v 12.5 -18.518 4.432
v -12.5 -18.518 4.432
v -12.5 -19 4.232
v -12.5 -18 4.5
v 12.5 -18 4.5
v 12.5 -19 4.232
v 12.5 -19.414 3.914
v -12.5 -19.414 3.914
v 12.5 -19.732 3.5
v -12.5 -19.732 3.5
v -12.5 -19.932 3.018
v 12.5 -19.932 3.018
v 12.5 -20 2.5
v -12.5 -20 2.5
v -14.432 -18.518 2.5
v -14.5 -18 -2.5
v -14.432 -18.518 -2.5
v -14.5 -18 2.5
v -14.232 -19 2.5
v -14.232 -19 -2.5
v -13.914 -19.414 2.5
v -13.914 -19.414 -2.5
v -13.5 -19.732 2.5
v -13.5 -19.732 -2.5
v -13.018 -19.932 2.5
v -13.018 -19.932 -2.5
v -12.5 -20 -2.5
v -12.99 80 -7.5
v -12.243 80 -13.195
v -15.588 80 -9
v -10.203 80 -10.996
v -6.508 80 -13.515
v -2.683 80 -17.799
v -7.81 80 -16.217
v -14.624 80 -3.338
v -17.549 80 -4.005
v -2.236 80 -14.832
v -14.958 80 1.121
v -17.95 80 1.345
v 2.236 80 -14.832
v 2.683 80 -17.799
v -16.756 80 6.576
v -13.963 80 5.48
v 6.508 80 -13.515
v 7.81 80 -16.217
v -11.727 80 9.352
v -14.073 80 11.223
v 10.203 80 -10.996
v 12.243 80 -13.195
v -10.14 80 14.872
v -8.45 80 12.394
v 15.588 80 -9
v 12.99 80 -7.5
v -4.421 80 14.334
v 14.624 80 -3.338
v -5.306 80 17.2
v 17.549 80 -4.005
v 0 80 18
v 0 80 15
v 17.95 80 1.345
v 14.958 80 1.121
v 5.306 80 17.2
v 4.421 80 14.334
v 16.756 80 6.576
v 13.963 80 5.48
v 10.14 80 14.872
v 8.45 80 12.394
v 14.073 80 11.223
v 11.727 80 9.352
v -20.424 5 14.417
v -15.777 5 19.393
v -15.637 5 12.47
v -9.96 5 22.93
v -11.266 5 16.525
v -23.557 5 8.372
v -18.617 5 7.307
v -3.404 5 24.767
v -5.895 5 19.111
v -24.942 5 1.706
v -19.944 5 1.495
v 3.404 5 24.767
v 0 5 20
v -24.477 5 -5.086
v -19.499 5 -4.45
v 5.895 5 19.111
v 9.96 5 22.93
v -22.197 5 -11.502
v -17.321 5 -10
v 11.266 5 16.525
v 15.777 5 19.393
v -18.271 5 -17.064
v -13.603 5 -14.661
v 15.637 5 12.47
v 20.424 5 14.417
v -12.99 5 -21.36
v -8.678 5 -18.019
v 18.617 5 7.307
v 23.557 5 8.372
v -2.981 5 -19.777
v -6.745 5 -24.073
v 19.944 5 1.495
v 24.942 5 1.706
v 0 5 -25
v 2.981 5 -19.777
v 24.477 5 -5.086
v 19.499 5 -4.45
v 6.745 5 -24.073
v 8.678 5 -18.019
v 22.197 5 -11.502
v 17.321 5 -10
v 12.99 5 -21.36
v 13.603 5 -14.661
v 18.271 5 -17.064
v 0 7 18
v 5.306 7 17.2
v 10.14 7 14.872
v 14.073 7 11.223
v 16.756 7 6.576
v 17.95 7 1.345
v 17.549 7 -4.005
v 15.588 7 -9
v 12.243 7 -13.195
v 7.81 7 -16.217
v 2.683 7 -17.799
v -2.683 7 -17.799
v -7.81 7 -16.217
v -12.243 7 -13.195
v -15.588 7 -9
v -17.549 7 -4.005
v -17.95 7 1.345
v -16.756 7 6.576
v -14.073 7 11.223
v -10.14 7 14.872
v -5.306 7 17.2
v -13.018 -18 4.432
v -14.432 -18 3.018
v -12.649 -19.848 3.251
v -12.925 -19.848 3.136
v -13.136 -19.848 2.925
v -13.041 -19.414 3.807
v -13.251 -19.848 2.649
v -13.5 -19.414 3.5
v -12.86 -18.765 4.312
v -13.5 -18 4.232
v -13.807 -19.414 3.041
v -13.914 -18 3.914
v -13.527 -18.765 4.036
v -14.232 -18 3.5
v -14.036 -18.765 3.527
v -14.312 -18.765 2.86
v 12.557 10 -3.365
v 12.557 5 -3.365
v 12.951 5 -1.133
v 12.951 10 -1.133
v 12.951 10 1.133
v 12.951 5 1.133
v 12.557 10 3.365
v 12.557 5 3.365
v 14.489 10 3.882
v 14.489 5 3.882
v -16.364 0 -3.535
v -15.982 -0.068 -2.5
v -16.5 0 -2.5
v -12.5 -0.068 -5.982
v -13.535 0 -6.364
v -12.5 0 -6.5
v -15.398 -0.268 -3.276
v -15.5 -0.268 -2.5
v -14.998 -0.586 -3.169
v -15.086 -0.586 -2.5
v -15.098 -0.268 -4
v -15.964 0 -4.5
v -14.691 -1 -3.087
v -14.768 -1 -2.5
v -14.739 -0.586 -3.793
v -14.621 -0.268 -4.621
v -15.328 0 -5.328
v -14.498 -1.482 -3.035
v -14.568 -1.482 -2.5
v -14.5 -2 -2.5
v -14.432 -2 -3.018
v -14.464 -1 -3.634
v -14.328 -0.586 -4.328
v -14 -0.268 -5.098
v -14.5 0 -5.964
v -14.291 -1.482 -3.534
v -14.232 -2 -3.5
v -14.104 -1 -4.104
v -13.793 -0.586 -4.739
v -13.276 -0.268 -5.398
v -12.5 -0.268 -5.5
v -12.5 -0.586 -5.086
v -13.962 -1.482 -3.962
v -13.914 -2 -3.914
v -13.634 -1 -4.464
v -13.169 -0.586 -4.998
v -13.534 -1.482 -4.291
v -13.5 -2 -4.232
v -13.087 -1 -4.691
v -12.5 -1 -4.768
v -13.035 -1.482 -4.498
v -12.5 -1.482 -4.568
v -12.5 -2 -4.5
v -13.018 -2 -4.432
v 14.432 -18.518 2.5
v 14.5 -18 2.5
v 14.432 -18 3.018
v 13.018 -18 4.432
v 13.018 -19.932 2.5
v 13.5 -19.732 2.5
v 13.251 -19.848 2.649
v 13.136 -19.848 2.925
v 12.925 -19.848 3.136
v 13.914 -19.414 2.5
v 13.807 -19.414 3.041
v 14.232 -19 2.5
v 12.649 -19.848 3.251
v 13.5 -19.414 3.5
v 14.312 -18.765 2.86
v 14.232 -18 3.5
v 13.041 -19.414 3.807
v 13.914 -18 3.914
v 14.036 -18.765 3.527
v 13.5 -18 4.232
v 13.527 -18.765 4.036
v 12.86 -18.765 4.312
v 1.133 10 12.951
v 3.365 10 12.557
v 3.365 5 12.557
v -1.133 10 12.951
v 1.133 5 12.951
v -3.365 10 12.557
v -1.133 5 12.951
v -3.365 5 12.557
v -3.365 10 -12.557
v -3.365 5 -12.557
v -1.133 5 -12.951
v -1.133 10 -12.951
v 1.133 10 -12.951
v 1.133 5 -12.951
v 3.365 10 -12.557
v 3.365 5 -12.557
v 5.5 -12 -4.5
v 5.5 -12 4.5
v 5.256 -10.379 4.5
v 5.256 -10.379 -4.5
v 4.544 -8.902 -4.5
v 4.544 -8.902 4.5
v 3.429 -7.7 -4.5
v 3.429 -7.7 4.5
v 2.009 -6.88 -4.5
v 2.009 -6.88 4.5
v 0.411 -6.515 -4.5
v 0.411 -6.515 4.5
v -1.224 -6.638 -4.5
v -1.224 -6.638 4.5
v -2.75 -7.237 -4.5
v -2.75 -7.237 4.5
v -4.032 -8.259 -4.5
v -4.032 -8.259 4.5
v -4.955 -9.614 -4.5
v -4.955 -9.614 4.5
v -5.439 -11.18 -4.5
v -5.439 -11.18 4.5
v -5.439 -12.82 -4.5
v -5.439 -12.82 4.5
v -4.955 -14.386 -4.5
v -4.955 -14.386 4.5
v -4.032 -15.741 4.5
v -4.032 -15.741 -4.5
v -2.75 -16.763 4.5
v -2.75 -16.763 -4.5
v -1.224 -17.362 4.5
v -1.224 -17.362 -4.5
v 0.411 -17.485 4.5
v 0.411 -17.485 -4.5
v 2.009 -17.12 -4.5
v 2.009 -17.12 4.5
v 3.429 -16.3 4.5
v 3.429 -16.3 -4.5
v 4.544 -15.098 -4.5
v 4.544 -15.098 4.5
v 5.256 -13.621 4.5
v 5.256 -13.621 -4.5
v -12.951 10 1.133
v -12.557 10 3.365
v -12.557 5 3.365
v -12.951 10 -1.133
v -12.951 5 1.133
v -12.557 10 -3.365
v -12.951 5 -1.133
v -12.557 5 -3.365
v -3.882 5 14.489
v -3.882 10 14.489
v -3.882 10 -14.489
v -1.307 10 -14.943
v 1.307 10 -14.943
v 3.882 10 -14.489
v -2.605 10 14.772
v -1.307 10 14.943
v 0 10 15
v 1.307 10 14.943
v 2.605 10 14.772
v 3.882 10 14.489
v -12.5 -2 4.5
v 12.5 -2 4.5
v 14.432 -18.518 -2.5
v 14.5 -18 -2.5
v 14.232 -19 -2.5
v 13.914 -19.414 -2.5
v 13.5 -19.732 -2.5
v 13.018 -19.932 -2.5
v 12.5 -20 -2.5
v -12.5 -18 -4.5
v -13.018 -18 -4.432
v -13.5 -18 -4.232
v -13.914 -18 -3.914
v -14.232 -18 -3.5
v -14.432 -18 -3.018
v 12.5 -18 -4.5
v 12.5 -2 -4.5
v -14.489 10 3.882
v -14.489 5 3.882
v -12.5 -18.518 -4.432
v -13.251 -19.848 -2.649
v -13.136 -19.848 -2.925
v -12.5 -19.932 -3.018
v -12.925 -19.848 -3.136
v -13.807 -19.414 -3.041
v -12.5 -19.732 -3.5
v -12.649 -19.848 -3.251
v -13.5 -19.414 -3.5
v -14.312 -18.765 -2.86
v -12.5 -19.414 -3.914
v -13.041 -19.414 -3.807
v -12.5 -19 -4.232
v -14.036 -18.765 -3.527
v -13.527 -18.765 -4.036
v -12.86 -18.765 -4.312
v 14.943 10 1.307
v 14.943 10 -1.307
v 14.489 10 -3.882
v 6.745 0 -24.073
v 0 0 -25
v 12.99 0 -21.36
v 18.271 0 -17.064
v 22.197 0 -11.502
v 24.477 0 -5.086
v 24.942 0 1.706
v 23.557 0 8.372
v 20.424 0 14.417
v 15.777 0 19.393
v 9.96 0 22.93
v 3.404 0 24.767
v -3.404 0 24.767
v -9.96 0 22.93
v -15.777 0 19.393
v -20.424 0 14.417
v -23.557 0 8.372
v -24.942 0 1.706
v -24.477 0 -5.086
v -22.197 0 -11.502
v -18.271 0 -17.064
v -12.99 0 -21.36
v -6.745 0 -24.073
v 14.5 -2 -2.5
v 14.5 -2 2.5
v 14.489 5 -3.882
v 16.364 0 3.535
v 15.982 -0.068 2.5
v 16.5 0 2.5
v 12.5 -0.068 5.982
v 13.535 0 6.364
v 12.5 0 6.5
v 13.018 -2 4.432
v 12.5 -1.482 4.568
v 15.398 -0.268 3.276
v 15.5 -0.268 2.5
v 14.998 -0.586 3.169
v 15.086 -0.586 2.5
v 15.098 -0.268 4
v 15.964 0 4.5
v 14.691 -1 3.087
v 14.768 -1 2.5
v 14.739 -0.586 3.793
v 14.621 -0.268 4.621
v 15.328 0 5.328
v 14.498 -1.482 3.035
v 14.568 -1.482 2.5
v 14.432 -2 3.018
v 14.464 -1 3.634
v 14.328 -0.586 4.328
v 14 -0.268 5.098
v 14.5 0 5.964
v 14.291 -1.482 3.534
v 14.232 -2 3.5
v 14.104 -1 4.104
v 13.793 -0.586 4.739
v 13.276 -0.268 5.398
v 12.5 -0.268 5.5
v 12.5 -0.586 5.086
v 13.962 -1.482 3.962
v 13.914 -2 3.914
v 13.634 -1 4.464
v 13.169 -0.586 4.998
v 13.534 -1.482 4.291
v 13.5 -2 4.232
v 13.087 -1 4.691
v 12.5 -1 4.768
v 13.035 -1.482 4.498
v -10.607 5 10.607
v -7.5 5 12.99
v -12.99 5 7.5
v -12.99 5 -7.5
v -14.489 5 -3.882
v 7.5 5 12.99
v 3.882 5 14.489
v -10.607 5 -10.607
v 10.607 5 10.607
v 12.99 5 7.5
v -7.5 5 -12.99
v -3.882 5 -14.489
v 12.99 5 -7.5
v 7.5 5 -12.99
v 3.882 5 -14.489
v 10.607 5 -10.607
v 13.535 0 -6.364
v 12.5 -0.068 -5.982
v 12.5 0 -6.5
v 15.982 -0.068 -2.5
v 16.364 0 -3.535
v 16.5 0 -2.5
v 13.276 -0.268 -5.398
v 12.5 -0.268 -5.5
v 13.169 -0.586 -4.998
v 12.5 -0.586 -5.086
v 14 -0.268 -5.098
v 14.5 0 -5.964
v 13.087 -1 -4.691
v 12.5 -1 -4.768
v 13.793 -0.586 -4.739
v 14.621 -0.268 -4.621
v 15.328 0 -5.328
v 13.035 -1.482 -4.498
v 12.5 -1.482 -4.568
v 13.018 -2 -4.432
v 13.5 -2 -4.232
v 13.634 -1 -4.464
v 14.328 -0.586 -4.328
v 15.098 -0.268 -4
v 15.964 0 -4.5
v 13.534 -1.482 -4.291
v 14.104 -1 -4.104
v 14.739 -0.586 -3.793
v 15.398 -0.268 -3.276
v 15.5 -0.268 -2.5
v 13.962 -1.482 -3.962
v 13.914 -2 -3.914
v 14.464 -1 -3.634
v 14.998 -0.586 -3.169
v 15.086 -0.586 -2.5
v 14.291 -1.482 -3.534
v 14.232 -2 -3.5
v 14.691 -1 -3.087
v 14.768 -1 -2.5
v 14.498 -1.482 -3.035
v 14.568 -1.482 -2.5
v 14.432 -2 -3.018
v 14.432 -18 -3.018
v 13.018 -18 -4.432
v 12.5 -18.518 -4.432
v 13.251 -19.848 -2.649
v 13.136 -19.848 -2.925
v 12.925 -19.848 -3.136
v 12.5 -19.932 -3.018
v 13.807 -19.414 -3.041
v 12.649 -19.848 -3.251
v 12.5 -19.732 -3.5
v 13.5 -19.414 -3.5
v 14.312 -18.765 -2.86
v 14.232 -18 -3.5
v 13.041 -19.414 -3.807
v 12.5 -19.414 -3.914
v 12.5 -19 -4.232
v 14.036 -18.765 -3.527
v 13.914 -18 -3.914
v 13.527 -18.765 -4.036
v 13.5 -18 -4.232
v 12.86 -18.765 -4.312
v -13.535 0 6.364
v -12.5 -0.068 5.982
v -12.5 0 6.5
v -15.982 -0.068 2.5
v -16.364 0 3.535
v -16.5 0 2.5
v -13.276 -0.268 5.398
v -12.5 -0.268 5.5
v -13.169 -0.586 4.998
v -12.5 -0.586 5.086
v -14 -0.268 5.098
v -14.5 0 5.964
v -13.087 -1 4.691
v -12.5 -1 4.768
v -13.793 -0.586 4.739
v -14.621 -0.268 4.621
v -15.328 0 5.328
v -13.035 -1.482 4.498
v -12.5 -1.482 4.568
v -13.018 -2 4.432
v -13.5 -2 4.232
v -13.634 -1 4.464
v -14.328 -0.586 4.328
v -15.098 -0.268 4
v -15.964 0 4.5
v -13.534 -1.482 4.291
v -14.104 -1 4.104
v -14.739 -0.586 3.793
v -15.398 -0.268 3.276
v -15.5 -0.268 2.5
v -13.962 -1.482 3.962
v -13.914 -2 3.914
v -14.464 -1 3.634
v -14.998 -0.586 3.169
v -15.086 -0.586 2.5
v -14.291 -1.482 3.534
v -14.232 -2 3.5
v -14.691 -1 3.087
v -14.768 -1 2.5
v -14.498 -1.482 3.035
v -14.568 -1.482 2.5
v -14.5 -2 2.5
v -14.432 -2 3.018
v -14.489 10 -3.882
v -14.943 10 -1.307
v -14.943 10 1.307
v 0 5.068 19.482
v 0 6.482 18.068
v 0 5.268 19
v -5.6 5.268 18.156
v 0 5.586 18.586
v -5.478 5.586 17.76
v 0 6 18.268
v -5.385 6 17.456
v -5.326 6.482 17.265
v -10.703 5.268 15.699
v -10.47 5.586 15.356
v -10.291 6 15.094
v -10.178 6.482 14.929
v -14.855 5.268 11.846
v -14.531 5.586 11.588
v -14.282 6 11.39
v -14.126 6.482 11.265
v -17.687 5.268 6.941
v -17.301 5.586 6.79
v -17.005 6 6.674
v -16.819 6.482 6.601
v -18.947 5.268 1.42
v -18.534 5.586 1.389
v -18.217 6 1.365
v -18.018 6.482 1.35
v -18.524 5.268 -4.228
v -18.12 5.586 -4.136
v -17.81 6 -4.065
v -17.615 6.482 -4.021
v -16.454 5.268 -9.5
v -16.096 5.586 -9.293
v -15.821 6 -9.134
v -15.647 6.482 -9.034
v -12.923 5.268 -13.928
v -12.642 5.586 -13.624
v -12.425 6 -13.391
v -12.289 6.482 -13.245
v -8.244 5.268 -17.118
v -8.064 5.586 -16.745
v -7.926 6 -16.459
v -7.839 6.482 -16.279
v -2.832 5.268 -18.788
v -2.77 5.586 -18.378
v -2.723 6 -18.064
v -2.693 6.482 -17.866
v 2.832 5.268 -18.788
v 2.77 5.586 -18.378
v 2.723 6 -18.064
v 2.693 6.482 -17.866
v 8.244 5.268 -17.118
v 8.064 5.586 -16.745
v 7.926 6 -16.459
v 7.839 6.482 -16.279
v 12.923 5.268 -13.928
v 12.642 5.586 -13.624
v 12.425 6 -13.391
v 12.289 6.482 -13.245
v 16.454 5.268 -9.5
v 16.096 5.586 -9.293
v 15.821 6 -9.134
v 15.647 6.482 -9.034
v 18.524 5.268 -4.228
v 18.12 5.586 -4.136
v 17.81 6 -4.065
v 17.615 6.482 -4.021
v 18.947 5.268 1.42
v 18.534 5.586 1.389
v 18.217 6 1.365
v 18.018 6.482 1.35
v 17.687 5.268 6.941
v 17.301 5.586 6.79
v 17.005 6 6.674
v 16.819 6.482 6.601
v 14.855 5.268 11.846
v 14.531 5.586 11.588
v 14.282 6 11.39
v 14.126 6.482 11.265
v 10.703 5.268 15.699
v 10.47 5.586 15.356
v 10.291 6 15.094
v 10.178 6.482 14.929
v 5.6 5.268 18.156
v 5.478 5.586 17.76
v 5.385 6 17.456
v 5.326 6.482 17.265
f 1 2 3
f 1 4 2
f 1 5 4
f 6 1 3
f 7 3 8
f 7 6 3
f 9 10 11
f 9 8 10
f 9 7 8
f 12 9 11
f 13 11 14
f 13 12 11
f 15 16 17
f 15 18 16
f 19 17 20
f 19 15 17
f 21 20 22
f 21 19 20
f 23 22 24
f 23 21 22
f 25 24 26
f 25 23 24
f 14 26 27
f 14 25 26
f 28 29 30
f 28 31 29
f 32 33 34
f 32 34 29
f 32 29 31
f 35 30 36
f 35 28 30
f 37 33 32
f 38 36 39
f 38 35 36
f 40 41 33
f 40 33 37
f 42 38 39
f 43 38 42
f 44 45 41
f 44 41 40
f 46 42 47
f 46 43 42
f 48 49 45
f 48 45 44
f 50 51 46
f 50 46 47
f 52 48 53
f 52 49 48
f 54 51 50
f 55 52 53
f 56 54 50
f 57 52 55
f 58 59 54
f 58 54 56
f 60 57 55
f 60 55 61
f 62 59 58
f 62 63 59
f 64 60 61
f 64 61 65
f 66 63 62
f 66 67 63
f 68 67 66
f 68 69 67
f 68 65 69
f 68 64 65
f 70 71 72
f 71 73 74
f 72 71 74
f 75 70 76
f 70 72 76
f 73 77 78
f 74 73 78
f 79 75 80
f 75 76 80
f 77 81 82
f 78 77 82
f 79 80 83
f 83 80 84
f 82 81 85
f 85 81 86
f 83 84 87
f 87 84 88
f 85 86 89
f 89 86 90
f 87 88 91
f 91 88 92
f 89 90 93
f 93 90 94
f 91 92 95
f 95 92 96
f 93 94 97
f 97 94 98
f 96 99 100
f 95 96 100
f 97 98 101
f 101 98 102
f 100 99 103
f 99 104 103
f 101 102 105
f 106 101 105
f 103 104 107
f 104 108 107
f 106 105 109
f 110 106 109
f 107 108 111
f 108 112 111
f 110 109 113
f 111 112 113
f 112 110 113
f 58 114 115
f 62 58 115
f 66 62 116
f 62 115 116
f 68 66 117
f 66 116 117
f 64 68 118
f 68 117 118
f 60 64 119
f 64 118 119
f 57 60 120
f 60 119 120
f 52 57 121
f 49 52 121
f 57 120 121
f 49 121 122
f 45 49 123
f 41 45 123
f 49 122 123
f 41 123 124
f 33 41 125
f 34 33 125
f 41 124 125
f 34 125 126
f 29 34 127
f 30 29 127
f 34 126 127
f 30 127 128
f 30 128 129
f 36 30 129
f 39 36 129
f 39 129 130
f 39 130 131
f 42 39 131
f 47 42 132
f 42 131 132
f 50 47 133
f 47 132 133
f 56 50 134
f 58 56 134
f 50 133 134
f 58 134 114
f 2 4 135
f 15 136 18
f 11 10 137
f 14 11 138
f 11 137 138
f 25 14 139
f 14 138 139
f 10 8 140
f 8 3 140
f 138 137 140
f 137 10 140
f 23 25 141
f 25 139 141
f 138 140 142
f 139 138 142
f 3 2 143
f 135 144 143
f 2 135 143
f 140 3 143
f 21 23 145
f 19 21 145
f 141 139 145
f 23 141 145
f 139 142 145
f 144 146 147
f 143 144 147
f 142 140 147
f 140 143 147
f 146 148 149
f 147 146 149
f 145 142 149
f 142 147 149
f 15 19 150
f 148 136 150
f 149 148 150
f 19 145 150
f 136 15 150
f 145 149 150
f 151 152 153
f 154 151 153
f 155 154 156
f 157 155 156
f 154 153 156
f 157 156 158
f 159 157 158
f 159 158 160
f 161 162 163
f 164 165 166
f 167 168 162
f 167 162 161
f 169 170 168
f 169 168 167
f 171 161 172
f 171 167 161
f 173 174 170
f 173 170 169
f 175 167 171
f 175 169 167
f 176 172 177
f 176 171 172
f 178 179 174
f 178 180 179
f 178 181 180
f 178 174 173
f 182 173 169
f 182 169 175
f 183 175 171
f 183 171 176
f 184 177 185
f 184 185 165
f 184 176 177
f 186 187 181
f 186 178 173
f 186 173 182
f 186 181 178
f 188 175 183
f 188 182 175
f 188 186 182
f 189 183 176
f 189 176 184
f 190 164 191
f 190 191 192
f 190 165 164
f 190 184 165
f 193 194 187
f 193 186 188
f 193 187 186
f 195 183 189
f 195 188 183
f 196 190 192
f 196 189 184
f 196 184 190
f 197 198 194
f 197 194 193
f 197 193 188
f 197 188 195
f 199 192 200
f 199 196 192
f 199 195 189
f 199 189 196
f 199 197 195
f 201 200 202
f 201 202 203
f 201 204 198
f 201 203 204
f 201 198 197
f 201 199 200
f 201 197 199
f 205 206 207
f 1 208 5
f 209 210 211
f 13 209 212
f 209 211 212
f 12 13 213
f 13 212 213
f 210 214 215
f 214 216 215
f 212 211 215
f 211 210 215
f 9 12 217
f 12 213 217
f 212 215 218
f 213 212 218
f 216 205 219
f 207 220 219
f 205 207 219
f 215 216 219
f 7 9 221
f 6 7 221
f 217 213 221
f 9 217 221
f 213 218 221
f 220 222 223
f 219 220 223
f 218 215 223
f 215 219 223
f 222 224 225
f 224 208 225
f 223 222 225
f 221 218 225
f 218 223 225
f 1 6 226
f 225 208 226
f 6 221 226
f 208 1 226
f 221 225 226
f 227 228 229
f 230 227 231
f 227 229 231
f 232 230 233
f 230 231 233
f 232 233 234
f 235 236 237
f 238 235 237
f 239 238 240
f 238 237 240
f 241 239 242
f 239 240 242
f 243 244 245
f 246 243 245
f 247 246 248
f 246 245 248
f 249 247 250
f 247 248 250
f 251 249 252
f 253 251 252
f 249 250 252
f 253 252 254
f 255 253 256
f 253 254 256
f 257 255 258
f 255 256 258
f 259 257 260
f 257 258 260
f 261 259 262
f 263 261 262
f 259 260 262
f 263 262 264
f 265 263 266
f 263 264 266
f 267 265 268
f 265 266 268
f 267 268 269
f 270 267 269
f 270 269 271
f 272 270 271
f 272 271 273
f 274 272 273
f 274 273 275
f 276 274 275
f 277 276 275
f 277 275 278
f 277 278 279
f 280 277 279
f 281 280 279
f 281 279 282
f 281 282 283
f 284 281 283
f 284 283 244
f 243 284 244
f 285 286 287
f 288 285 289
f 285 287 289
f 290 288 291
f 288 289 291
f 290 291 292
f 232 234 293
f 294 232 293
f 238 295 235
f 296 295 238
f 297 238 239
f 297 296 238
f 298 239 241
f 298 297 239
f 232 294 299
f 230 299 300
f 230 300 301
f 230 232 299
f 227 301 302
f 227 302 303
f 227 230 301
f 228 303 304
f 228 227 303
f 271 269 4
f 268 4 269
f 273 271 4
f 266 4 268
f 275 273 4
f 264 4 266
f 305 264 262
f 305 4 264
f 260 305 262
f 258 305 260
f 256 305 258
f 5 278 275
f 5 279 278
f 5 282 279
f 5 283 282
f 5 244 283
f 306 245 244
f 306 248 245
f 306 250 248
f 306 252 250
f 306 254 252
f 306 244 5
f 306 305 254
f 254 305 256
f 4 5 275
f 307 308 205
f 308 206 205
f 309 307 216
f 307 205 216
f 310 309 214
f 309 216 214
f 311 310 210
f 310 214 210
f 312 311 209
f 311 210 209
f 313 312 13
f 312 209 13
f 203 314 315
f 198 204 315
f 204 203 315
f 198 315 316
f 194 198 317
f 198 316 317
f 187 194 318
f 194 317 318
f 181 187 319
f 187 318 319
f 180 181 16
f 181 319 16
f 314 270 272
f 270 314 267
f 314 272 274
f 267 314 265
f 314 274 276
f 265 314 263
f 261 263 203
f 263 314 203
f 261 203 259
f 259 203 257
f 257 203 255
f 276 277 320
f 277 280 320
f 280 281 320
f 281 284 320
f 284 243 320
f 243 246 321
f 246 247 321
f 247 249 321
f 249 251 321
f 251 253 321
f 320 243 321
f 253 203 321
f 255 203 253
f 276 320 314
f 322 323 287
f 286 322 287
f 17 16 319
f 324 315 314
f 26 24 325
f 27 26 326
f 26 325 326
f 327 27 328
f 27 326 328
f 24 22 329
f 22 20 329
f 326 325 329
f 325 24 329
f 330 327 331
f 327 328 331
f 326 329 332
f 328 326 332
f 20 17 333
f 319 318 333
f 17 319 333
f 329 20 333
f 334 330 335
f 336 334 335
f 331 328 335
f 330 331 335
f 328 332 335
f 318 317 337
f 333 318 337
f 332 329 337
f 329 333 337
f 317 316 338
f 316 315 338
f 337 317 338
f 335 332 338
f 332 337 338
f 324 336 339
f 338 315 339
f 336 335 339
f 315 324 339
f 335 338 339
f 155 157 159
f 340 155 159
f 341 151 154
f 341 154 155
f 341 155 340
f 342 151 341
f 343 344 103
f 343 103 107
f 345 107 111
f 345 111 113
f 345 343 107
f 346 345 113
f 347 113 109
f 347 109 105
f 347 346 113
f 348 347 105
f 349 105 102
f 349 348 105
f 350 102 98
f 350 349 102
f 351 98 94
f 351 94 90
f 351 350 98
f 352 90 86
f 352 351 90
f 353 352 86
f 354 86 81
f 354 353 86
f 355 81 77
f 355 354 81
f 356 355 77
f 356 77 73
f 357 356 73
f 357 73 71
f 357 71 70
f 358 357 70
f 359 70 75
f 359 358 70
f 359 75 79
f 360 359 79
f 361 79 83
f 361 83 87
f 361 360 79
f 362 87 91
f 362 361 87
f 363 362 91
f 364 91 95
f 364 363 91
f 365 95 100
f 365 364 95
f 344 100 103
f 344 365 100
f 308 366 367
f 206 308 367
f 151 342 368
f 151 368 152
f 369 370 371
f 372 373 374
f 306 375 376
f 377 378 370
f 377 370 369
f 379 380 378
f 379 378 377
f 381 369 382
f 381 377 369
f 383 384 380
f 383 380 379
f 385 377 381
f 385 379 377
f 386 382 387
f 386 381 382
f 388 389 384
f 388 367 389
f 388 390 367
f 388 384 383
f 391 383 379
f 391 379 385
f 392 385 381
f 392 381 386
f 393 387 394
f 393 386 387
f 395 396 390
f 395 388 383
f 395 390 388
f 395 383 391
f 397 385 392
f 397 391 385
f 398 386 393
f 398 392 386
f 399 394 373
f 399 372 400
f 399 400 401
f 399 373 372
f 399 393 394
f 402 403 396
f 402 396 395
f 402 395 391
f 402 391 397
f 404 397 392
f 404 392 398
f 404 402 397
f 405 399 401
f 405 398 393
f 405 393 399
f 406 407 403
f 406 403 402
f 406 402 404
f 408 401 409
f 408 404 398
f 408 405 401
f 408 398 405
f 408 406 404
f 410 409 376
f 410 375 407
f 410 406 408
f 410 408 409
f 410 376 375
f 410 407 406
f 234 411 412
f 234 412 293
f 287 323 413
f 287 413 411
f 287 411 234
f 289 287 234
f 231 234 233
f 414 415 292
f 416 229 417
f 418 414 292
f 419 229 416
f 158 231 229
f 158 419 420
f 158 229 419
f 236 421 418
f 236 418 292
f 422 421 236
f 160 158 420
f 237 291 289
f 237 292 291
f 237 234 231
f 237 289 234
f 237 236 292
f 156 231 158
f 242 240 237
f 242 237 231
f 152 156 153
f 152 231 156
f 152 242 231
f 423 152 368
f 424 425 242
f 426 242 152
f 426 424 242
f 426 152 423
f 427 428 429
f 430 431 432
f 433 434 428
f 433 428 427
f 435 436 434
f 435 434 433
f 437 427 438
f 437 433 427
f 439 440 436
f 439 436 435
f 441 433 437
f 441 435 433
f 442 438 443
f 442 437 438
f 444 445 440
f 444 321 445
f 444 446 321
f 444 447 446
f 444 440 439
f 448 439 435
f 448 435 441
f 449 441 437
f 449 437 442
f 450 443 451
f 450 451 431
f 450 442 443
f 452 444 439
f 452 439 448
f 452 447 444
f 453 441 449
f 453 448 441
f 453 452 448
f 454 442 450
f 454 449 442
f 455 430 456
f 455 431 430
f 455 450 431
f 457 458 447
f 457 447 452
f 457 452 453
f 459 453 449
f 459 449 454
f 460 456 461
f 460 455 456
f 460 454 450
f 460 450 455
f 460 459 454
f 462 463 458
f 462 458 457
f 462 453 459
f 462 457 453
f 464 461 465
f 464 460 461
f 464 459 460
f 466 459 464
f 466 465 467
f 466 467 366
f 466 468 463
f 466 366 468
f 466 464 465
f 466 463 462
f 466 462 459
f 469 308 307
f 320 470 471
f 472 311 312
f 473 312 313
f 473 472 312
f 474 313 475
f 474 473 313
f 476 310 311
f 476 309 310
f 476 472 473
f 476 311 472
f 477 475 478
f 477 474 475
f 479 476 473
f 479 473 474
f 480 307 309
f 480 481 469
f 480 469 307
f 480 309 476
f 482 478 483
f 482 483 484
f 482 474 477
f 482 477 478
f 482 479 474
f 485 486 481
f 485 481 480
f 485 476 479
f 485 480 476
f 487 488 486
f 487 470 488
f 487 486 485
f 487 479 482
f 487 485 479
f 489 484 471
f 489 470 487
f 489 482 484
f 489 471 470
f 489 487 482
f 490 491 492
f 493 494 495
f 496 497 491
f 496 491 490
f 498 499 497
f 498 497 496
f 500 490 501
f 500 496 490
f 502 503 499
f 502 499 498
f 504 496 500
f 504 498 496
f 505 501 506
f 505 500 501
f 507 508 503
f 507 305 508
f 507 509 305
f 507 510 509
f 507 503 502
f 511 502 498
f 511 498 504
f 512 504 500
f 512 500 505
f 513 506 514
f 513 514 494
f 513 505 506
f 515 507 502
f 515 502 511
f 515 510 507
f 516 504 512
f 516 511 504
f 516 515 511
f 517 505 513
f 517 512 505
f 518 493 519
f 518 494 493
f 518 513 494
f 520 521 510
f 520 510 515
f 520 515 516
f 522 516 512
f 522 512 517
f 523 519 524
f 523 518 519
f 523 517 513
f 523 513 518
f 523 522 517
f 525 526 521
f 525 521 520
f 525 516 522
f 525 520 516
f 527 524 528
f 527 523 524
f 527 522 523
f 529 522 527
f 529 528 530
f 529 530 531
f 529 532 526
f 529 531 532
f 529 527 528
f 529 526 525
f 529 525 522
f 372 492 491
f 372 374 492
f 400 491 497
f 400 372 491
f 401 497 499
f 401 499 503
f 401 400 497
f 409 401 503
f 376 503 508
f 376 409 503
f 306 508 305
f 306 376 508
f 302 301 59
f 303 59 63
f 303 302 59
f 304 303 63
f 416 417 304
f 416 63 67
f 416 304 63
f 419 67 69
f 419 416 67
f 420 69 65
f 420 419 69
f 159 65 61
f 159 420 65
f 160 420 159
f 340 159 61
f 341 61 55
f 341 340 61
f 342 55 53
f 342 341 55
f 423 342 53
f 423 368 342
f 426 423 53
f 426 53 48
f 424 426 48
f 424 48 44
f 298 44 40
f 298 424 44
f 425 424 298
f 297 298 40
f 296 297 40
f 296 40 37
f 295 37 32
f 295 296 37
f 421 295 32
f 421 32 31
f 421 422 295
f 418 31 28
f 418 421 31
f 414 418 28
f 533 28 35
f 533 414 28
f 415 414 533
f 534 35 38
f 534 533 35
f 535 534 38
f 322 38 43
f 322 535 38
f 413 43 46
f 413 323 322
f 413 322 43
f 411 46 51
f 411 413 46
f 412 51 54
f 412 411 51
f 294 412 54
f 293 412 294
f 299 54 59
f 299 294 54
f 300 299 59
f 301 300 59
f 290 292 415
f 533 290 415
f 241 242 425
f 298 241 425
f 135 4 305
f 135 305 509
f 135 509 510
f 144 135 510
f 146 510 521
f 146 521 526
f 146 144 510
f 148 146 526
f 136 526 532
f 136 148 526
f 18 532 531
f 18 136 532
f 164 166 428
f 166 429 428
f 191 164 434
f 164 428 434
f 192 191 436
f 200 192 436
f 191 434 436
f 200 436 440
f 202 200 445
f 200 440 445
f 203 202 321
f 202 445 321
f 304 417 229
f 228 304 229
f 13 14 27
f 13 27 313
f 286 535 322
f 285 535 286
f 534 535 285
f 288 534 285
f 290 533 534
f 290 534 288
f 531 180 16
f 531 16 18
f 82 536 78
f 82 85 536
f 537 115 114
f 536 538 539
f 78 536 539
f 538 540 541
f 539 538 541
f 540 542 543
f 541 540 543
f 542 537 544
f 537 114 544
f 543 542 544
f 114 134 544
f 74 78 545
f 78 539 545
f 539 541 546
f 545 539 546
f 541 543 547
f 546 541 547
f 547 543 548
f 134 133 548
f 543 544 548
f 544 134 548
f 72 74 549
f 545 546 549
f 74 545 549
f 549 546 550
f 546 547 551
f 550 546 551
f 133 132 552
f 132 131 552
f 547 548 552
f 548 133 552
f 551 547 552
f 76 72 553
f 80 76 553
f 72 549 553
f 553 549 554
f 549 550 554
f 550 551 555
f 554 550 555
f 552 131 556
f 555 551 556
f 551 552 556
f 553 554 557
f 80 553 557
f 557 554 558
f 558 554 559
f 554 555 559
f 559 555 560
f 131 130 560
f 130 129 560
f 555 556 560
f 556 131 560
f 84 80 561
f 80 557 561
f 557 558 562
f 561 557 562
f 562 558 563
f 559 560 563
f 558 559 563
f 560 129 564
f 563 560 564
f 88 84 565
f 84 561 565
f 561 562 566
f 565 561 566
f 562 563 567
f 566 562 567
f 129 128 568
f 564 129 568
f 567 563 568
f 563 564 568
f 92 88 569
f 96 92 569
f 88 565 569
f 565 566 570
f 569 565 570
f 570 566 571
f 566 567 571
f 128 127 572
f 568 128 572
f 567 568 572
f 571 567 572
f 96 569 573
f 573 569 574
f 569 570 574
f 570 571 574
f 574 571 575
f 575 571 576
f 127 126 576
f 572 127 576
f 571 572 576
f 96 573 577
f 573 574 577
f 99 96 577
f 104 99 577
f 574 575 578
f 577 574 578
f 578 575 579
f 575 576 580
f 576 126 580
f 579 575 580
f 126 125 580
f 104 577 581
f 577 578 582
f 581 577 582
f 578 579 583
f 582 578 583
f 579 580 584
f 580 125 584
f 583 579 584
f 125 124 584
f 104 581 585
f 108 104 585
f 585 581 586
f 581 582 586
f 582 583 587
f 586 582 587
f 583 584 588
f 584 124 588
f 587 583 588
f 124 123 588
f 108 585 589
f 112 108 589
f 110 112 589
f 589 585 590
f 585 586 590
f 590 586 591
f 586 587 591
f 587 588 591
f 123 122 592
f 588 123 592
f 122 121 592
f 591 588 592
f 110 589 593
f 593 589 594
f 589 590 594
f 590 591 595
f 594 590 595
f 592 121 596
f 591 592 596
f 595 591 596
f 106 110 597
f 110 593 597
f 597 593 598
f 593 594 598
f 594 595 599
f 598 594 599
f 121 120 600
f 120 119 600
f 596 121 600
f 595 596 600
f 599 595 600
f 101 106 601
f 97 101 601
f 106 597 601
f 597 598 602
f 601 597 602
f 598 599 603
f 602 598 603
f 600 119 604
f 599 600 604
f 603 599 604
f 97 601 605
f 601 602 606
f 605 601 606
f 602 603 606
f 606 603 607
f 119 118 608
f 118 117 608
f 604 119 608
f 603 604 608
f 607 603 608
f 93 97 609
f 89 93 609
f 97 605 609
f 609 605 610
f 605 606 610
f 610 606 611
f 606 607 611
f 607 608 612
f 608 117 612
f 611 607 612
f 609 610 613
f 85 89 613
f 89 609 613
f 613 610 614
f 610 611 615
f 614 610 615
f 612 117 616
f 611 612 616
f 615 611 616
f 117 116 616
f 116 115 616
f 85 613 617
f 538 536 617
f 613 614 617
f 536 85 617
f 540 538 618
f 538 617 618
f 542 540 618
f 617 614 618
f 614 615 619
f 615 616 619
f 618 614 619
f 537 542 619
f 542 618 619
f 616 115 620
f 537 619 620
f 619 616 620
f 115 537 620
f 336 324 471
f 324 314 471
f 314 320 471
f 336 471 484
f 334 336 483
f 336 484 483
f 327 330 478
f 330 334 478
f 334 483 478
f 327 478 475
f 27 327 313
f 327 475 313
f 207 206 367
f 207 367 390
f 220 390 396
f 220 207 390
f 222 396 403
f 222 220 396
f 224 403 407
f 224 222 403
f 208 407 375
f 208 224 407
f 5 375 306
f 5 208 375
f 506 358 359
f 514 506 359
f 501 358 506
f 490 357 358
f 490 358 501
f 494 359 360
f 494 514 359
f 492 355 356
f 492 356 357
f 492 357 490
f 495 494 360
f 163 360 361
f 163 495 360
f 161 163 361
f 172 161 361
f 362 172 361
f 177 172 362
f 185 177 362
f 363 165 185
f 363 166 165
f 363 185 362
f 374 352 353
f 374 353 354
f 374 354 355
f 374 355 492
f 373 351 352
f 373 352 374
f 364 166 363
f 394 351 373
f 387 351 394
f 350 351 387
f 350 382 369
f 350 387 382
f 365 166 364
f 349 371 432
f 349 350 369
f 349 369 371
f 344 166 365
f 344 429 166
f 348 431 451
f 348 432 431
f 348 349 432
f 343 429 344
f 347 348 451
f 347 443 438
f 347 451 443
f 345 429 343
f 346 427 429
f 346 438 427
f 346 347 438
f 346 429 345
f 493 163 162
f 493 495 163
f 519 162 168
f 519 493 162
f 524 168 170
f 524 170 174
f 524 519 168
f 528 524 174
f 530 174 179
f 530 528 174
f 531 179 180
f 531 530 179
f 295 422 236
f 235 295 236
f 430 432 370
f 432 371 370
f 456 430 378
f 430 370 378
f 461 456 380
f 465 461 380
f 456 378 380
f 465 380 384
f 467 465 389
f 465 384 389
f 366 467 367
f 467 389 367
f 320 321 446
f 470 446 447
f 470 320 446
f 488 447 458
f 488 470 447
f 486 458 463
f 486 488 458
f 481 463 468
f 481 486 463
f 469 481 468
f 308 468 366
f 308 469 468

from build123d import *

# Parameters (mm, degrees)
SKETCH1_R            = 18
BOSS_EXTRUDE1_DEPTH  = 80
SKETCH1_3_R          = 15
SKETCH1_3_R_2        = 13
BOSS_EXTRUDE2_DEPTH  = 5
BOSS_EXTRUDE4_DEPTH  = 10
SKETCH3_R            = 25
SKETCH3_R_2          = 18
SKETCH3_R_3          = 13
BOSS_EXTRUDE6_DEPTH  = 5
SKETCH15_W           = 29
SKETCH15_H           = 9
BOSS_EXTRUDE13_DEPTH = 20
SKETCH16_R           = 5.5
CUT_EXTRUDE3_DEPTH   = 89.855219318
FILLET1_R            = 2


with BuildPart() as part:
    # Sketch1 → Boss-Extrude1 (new body)
    with BuildSketch(Plane(origin=(0, 0, 0), x_dir=(1, 0, 0), z_dir=(0, 1, 0))):
        Circle(SKETCH1_R)
        with BuildLine():
            ThreePointArc((-3.882285677, 14.488887394), (0, 15), (3.882285677, 14.488887394))
            ThreePointArc((3.882285677, 14.488887394), (10.606601718, 10.606601718), (14.488887394, 3.882285677))
            ThreePointArc((14.488887394, 3.882285677), (14.871672921, 1.957892883), (15, 0))
            ThreePointArc((15, 0), (14.871672921, -1.957892883), (14.488887394, -3.882285677))
            ThreePointArc((14.488887394, -3.882285677), (10.606601718, -10.606601718), (3.882285677, -14.488887394))
            ThreePointArc((3.882285677, -14.488887394), (0, -15), (-3.882285677, -14.488887394))
            ThreePointArc((-3.882285677, -14.488887394), (-10.606601718, -10.606601718), (-14.488887394, -3.882285677))
            ThreePointArc((-14.488887394, -3.882285677), (-15, 0), (-14.488887394, 3.882285677))
            ThreePointArc((-14.488887394, 3.882285677), (-10.606601718, 10.606601718), (-3.882285677, 14.488887394))
        make_face(mode=Mode.SUBTRACT)
    extrude(amount=BOSS_EXTRUDE1_DEPTH)

    # Sketch1<3> → Boss-Extrude2 (add)
    with BuildSketch(Plane(origin=(0, 0, 0), x_dir=(1, 0, 0), z_dir=(0, 1, 0))):
        Circle(SKETCH1_3_R)
        Circle(SKETCH1_3_R_2, mode=Mode.SUBTRACT)
    extrude(amount=BOSS_EXTRUDE2_DEPTH)

    # Sketch1<4> → Boss-Extrude4 (add)
    with BuildSketch(Plane(origin=(0, 0, 0), x_dir=(1, 0, 0), z_dir=(0, 1, 0))):
        with BuildLine():
            Line((3.364647586, 12.557035742), (3.882285677, 14.488887394))
            ThreePointArc((3.882285677, 14.488887394), (0, 15), (-3.882285677, 14.488887394))
            Line((-3.882285677, 14.488887394), (-3.364647586, 12.557035742))
            ThreePointArc((-3.364647586, 12.557035742), (0, 13), (3.364647586, 12.557035742))
        make_face()
        with BuildLine():
            ThreePointArc((14.488887394, -3.882285677), (15, 0), (14.488887394, 3.882285677))
            Line((14.488887394, 3.882285677), (12.557035742, 3.364647586))
            ThreePointArc((12.557035742, 3.364647586), (13, 0), (12.557035742, -3.364647586))
            Line((12.557035742, -3.364647586), (14.488887394, -3.882285677))
        make_face()
        with BuildLine():
            Line((-12.557035742, 3.364647586), (-14.488887394, 3.882285677))
            ThreePointArc((-14.488887394, 3.882285677), (-15, 0), (-14.488887394, -3.882285677))
            Line((-14.488887394, -3.882285677), (-12.557035742, -3.364647586))
            ThreePointArc((-12.557035742, -3.364647586), (-13, 0), (-12.557035742, 3.364647586))
        make_face()
        with BuildLine():
            ThreePointArc((-3.882285677, -14.488887394), (0, -15), (3.882285677, -14.488887394))
            Line((3.882285677, -14.488887394), (3.364647586, -12.557035742))
            ThreePointArc((3.364647586, -12.557035742), (0, -13), (-3.364647586, -12.557035742))
            Line((-3.364647586, -12.557035742), (-3.882285677, -14.488887394))
        make_face()
    extrude(amount=BOSS_EXTRUDE4_DEPTH)

    # Sketch3 → Boss-Extrude6 (add)
    # profile 1 of 2: a face of its own
    with BuildSketch(Plane.XZ):
        Circle(SKETCH3_R)
        Circle(SKETCH3_R_2, mode=Mode.SUBTRACT)
    # profile 2 of 2: a face of its own
    with BuildSketch(Plane.XZ):
        Circle(SKETCH3_R_3)
    extrude(amount=-BOSS_EXTRUDE6_DEPTH)

    # Sketch15 → Boss-Extrude13 (add)
    with BuildSketch(Plane.XZ):
        Rectangle(SKETCH15_W, SKETCH15_H)
    extrude(amount=BOSS_EXTRUDE13_DEPTH)

    # Sketch16 → Cut-Extrude3 (cut, through all)
    with BuildSketch(Plane.XY.offset(4.5)):
        with Locations((0, -12)):
            Circle(SKETCH16_R)
    extrude(amount=-CUT_EXTRUDE3_DEPTH, mode=Mode.SUBTRACT)

    # Fillet1
    fillet1_edges = [part.edges().sort_by_distance(p)[0] for p in [
        (0, 0, 4.5),
        (-14.5, 0, 0),
        (-14.5, -20, 0),
        (14.5, -20, 0),
        (0, -20, -4.5),
        (0, -20, 4.5),
        (14.5, -10, 4.5),
        (-14.5, -10, 4.5),
        (-14.5, -10, -4.5),
        (14.5, -10, -4.5),
        (0, 0, -4.5),
        (14.5, 0, 0),
        (-18, 5, 0),
    ]]
    fillet(fillet1_edges, radius=FILLET1_R)


solid = part.part
